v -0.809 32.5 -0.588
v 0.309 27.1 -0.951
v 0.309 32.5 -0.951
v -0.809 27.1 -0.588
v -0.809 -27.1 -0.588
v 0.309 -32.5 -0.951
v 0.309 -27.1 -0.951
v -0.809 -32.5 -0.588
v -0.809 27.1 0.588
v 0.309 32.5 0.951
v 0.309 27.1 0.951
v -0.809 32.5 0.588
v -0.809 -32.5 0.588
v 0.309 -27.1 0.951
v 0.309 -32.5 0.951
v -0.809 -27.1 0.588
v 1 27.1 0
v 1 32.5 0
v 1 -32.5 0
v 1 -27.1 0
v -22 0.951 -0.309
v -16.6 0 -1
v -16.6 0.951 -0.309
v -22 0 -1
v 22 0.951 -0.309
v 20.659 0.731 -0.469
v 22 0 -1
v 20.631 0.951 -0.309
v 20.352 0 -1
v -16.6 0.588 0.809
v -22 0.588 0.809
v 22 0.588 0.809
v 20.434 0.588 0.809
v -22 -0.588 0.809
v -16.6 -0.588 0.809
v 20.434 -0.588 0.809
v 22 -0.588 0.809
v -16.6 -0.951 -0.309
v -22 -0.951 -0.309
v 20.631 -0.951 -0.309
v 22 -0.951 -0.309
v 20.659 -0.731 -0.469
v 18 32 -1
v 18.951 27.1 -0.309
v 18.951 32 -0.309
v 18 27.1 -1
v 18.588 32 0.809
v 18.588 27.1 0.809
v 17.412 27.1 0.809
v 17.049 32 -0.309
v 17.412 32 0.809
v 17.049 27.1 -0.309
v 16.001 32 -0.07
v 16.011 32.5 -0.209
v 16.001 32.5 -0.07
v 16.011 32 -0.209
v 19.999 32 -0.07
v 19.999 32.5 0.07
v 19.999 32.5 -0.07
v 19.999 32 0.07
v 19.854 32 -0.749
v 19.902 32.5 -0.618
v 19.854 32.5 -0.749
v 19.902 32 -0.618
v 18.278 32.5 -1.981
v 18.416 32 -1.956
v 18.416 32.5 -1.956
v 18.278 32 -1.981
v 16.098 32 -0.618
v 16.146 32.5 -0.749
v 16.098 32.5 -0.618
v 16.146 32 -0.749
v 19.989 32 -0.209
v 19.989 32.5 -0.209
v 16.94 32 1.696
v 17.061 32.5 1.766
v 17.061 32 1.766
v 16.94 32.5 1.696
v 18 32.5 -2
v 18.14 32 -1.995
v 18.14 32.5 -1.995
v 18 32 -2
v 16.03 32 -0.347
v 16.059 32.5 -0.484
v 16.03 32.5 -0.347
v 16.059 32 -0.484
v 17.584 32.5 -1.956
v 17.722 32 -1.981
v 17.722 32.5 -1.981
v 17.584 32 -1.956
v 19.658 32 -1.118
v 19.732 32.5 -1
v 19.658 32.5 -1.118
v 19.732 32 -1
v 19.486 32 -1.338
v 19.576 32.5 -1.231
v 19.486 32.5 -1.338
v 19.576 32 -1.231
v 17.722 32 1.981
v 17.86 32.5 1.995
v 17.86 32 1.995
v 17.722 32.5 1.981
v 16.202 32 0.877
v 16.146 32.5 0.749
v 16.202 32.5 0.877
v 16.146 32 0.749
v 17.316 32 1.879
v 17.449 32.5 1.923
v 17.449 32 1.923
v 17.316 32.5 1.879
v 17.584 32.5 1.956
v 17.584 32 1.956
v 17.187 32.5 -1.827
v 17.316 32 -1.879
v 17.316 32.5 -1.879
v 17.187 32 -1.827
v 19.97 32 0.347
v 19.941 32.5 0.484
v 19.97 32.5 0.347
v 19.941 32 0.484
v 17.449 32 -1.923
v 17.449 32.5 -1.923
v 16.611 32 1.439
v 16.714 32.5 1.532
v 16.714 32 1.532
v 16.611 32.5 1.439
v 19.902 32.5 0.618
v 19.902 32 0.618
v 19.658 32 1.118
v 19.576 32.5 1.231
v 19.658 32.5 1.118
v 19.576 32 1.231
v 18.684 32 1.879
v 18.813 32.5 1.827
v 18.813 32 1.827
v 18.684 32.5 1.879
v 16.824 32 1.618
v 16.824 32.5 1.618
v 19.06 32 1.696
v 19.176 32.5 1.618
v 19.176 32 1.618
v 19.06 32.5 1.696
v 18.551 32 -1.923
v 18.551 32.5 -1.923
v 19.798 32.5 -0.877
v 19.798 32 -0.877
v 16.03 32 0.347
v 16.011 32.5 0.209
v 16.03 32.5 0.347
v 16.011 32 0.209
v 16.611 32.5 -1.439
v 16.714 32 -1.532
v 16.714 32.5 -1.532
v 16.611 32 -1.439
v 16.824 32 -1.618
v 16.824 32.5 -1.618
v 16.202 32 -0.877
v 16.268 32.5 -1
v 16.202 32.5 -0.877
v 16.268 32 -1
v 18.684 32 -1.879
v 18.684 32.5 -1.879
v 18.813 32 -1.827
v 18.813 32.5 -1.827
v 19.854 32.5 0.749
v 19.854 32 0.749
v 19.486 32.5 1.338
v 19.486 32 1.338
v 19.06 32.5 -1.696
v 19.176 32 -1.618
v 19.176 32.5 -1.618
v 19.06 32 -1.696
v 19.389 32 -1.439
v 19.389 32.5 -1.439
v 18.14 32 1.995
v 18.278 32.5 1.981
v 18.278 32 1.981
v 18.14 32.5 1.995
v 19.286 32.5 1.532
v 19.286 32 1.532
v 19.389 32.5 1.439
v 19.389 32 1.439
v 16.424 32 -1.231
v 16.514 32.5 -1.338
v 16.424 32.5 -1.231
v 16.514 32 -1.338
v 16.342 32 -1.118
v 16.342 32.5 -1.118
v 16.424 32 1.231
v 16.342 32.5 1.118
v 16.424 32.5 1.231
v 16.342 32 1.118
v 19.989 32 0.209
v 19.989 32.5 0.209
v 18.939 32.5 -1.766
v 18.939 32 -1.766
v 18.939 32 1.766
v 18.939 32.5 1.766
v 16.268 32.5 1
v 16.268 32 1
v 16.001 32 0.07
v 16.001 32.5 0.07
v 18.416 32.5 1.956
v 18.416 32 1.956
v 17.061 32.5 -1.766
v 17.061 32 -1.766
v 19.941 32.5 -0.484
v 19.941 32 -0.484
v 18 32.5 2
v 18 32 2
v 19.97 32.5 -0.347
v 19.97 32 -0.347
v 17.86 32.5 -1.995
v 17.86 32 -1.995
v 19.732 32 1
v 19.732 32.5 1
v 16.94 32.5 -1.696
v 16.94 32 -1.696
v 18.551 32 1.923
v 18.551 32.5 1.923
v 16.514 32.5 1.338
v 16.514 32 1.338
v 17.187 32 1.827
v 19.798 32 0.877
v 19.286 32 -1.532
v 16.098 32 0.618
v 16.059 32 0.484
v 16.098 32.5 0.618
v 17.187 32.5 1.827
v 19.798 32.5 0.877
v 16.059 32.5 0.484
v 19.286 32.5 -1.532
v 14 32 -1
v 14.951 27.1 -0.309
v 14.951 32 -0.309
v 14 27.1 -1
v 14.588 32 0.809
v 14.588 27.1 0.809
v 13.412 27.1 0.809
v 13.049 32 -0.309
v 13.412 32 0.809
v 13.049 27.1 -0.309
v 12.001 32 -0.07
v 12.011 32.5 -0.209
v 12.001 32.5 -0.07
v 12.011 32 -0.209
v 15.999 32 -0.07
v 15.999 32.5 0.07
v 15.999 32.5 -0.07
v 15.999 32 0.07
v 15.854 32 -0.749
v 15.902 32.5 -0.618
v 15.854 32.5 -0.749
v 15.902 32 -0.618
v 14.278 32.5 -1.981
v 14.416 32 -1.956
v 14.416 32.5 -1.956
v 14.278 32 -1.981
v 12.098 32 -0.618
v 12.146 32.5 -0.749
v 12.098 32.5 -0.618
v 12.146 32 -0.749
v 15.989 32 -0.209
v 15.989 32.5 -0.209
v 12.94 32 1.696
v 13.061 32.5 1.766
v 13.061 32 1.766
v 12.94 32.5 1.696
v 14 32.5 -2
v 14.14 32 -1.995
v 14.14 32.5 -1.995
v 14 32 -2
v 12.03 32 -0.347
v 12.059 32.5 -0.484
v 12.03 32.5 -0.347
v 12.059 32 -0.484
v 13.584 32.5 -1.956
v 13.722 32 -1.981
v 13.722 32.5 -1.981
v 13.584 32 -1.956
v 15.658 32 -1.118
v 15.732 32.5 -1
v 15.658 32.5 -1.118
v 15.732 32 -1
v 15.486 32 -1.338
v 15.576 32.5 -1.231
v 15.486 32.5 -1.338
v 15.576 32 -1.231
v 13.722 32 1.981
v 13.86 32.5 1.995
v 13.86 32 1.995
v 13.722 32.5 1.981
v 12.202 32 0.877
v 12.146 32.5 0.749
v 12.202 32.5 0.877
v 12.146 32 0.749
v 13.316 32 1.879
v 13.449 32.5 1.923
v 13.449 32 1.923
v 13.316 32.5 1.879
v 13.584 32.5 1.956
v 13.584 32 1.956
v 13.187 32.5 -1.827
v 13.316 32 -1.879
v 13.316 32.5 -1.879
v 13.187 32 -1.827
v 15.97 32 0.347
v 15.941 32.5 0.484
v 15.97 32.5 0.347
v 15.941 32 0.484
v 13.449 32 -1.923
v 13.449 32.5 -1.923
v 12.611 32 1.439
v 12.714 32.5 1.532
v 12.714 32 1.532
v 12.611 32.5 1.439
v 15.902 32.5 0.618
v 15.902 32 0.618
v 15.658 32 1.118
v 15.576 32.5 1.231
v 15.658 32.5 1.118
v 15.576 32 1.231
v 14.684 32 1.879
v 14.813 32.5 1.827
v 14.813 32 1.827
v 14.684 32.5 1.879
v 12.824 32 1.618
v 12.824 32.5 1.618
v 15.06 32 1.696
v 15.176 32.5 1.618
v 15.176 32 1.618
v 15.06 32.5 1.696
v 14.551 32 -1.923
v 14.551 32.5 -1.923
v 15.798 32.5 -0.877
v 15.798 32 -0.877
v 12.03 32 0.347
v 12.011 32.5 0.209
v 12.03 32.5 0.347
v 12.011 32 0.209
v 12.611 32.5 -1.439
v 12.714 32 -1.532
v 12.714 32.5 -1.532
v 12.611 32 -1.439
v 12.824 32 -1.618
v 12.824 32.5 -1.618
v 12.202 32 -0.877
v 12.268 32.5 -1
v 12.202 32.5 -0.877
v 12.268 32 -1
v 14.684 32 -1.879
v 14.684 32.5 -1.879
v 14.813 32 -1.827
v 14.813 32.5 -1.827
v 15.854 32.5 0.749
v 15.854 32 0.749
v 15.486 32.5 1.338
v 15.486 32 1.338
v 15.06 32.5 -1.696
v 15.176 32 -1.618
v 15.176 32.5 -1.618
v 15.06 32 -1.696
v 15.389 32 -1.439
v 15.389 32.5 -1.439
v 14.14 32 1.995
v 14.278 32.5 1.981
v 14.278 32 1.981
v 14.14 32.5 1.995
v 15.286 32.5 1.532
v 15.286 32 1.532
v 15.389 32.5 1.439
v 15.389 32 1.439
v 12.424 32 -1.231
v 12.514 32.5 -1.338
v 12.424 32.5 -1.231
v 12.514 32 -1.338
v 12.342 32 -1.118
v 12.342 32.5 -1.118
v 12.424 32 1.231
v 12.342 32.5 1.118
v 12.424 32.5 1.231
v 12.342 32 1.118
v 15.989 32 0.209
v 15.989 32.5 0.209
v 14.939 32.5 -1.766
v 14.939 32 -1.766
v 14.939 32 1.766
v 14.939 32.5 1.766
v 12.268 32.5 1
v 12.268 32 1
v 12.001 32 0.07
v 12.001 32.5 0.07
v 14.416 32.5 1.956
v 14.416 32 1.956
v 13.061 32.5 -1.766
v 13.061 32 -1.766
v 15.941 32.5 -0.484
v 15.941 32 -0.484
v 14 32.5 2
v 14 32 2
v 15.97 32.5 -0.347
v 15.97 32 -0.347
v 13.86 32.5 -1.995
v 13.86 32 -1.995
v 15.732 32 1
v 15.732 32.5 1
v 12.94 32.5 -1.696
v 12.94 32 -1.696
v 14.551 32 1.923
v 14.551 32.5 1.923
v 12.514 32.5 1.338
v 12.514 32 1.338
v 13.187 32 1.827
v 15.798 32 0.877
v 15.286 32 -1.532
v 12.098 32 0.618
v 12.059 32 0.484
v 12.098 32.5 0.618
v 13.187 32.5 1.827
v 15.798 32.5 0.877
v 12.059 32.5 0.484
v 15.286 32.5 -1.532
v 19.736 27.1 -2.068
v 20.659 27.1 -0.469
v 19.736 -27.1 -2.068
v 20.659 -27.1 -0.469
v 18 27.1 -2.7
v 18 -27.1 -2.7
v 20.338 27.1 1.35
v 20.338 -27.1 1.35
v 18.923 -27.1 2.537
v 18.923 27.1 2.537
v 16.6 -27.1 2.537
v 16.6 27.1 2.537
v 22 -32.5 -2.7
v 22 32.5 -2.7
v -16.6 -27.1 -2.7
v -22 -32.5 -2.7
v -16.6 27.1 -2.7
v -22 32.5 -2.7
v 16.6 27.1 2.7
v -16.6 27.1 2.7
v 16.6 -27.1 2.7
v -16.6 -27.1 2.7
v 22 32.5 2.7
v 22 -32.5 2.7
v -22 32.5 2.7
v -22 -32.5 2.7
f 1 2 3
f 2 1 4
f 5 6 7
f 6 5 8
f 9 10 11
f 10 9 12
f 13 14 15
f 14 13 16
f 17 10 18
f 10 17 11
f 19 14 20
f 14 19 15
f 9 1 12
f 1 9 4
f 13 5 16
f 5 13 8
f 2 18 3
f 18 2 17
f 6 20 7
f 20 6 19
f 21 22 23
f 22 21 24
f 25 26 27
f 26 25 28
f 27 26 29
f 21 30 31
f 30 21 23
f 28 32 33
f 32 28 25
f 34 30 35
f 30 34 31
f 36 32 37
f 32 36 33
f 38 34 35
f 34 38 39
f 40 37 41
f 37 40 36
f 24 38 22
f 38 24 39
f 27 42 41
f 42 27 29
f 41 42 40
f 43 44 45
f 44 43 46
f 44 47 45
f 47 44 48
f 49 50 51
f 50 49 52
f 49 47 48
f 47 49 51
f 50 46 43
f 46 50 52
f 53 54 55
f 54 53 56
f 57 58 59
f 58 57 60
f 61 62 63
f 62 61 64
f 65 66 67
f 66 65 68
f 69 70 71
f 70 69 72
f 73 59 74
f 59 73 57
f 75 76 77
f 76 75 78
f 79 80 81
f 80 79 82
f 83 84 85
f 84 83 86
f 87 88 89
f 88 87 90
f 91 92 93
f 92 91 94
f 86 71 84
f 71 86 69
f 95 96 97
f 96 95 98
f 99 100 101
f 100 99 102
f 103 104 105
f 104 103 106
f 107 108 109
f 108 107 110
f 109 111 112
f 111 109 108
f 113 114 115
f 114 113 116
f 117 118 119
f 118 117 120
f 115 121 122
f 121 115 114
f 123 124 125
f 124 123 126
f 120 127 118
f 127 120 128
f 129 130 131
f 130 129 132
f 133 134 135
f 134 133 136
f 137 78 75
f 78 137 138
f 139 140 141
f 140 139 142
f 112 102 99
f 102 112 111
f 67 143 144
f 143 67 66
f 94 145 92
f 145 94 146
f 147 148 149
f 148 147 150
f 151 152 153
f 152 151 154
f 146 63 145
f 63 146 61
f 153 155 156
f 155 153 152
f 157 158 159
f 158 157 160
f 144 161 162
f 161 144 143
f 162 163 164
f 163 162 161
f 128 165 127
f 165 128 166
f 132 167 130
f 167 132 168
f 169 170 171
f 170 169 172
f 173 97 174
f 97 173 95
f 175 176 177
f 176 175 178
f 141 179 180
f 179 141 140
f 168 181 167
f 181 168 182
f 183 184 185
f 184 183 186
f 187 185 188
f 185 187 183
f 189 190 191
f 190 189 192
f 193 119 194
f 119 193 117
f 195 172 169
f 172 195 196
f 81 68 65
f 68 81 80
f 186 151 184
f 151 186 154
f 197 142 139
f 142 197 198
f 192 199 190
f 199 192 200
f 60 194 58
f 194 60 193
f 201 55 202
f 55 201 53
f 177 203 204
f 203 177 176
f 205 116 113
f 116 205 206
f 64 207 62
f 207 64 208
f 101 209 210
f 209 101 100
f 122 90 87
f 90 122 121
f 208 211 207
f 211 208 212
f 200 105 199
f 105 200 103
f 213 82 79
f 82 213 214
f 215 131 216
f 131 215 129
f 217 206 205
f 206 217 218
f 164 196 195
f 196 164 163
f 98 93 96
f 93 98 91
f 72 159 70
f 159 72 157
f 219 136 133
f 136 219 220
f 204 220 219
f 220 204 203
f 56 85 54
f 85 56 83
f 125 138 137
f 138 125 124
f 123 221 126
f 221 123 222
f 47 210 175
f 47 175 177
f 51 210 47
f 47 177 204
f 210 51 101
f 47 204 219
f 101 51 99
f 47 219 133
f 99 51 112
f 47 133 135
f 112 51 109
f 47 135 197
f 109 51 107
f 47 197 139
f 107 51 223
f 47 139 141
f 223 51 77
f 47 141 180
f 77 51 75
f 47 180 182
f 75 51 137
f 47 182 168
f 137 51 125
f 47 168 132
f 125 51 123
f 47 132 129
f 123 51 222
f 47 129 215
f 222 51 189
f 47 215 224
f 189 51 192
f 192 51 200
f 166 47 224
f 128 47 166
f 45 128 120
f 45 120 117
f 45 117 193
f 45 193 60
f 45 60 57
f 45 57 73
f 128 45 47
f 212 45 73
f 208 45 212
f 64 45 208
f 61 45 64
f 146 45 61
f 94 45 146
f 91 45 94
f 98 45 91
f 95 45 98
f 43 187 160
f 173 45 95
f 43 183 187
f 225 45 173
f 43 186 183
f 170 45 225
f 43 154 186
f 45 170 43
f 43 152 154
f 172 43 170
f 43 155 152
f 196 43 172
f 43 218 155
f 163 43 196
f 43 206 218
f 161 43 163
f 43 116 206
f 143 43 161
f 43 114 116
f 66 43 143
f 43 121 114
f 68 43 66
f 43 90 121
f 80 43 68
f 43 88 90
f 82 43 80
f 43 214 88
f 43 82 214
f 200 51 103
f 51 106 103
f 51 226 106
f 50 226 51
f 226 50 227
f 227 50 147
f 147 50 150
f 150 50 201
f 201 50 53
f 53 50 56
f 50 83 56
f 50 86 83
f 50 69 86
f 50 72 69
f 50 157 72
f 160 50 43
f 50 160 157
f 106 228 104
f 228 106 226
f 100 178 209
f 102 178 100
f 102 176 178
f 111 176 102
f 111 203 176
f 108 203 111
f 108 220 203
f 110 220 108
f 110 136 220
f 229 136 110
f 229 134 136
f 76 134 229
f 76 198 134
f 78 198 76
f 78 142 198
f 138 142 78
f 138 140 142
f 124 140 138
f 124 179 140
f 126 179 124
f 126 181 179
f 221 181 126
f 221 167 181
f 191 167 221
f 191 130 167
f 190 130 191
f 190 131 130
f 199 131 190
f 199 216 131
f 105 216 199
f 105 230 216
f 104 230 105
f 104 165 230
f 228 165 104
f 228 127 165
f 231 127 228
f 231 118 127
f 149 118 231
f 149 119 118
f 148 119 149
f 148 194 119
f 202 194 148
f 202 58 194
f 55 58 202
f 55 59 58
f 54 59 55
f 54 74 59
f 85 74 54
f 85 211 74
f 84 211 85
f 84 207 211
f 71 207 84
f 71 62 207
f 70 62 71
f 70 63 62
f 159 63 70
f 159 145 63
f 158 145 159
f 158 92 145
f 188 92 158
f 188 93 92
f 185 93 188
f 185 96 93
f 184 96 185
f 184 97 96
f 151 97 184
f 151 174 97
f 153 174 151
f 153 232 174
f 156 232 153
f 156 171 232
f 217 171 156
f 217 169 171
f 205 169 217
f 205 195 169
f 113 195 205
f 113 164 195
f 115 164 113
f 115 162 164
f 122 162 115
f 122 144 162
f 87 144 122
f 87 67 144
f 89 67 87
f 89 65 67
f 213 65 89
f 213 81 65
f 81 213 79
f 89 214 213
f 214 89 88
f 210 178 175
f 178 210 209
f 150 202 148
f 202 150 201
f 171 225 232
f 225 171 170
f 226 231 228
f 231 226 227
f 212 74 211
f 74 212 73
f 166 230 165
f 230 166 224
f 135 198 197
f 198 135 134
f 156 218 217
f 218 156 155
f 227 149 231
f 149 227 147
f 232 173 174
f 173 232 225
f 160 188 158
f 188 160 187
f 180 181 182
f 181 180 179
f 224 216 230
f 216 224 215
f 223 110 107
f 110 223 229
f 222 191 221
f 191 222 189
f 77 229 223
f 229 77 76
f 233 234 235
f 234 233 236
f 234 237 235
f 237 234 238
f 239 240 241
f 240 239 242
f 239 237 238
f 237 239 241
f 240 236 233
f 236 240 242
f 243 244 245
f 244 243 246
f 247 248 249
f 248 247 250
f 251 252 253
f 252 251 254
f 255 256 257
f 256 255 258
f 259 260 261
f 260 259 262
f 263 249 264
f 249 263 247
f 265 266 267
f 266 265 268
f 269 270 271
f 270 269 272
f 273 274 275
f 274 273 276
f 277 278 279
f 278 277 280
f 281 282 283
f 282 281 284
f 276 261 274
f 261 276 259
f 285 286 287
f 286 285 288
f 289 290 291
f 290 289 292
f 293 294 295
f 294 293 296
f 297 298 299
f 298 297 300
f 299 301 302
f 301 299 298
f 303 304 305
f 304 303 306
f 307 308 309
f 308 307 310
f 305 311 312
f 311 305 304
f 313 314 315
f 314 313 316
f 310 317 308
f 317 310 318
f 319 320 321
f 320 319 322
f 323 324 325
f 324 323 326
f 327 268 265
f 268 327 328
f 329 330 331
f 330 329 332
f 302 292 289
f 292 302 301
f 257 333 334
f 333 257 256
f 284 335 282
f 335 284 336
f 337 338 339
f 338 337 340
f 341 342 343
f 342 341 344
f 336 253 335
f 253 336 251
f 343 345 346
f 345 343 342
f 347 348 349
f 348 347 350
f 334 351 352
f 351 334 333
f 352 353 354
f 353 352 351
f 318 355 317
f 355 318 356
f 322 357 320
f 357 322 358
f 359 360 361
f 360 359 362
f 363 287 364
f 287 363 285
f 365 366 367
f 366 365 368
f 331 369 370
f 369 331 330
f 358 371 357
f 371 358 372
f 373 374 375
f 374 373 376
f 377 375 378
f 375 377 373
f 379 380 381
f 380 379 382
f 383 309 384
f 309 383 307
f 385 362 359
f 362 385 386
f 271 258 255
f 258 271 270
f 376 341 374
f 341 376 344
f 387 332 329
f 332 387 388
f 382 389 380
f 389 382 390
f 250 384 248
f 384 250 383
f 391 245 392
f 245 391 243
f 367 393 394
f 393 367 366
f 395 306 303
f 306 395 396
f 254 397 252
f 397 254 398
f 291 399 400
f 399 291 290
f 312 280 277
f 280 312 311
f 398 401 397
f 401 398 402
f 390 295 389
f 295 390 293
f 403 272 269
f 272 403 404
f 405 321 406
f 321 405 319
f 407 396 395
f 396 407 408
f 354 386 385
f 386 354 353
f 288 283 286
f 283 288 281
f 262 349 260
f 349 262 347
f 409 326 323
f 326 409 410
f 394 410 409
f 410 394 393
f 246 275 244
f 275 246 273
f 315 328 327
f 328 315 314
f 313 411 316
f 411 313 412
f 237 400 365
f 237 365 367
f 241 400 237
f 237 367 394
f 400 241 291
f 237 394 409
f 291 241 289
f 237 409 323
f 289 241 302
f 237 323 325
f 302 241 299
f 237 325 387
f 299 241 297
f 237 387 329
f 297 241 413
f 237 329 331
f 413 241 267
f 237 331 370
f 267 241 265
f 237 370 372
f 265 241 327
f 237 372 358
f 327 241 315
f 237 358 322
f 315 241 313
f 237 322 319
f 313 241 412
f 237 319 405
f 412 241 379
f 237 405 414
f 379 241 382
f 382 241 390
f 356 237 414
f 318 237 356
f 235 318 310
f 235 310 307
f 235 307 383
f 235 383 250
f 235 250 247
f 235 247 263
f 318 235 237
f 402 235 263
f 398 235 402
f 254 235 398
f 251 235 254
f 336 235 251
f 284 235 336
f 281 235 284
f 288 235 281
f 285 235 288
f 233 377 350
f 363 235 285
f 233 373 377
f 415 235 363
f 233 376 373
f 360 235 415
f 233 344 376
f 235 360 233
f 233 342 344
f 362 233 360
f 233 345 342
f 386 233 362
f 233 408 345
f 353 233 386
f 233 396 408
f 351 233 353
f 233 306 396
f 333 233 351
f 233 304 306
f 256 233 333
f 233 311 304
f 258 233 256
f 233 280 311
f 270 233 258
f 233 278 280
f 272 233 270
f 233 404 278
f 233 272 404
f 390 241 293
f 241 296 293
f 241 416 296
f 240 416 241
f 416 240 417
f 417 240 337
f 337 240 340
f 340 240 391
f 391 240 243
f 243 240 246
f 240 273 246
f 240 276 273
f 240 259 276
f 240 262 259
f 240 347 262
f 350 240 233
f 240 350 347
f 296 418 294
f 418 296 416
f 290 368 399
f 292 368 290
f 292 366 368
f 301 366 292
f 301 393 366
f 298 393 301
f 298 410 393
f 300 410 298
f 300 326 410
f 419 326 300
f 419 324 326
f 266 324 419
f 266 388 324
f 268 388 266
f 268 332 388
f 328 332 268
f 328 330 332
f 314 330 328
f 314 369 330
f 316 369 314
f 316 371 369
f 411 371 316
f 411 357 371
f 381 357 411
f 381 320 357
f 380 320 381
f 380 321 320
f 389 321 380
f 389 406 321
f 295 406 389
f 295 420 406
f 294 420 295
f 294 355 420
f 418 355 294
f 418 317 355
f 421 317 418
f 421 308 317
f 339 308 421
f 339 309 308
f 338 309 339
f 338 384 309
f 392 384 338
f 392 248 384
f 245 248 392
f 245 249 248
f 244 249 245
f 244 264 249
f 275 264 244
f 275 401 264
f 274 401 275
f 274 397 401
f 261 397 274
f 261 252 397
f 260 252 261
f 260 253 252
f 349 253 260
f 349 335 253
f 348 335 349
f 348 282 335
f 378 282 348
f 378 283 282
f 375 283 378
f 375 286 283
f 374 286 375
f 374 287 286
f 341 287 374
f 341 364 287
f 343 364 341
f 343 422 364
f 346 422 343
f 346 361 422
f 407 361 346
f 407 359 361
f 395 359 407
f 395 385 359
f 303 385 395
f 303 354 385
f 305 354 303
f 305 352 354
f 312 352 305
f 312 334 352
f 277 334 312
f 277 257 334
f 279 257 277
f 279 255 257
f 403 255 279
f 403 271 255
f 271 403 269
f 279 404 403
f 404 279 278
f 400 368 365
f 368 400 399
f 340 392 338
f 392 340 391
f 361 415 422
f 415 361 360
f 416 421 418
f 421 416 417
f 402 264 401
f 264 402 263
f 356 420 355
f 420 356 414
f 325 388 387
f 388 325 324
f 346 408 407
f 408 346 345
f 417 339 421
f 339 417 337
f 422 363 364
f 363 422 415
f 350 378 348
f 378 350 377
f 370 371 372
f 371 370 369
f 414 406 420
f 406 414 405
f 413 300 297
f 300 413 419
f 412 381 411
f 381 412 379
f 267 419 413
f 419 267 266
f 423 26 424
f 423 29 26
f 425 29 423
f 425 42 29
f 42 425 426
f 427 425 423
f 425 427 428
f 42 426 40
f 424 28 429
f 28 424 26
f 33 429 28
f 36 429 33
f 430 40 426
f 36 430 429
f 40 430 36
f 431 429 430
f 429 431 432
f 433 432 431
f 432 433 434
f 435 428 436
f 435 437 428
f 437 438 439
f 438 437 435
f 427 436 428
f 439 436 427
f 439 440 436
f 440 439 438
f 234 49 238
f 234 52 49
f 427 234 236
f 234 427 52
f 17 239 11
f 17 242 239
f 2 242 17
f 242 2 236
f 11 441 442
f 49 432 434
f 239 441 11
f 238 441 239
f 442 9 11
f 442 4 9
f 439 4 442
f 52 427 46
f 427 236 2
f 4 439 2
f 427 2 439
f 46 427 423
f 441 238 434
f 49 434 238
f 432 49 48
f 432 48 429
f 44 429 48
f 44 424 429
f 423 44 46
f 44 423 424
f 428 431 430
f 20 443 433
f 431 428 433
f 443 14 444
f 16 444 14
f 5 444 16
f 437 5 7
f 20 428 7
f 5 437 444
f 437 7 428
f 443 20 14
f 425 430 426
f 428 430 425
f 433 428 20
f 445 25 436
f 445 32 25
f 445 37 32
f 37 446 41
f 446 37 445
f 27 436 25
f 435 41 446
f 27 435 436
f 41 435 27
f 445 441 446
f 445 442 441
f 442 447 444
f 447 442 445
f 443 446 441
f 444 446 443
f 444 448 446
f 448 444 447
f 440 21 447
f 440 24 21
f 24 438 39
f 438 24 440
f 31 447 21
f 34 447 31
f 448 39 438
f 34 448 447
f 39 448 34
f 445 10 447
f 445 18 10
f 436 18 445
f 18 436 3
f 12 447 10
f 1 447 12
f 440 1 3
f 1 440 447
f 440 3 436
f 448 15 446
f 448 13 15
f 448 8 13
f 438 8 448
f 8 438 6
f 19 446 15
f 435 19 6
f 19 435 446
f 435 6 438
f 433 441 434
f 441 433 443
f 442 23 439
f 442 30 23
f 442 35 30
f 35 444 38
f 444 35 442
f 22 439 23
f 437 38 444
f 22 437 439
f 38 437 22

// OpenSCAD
// Parametric Battery Power Supply
// Designed by Mike Creuzer thingiverse@creuzer.com 20130308




// The Width of the side that the contacts go on
BatteryWidth = 44;
// This very well may be the shorter side...
BatteryLength = 65;
// How thick the battery is
BatteryThickness = 5.4;

// How wide the nail shaft being used for the contact point is
PinThickness = 2;
// How wide the nail head being used for the contact point is
PinHeadThickness = 4;
// How thick the head of the nail being used for the contact point is
PinHeadDepth = .5;

// Center of pin to edge of battery block
Pin1DistanceFromEdge = 4;
// Center of pin to edge of battery block
Pin2DistanceFromEdge = 8;

// Size of hole to allow wire through the side of the battery
WireWidth = 2;
//WireDistanceFromEdge = 6;



// Build the box
difference()
{
	cube(size = [BatteryWidth, BatteryLength, BatteryThickness], center=true);
	cube(size = [BatteryWidth - BatteryThickness * 2, BatteryLength - BatteryThickness * 2, BatteryThickness + 1], center=true);
	WireHarness();
	InterfaceConnection();
}



module InterfaceConnection()
{
		translate([BatteryWidth * .5 - Pin1DistanceFromEdge, BatteryLength * .5,  0]) Pin();
		translate([BatteryWidth * .5 - Pin2DistanceFromEdge, BatteryLength * .5,  0]) Pin();
		
		hull() // Make sure this is room to solder the wires.
		{
			translate([BatteryWidth * .5 - Pin1DistanceFromEdge, BatteryLength * .5,  0]) PinElbowRoom();
			translate([BatteryWidth * .5 - Pin2DistanceFromEdge, BatteryLength * .5,  0]) PinElbowRoom();
		}
}


module Pin()
{
	translate([0, - (PinHeadDepth + BatteryThickness) * .5,  0]) union()
	{
	rotate([90,90,0]) cylinder(r = PinThickness * .5, h=BatteryThickness, center=true);
	translate([0, BatteryThickness * .5,  0]) rotate([90,90,0]) cylinder(r = PinHeadThickness * .5, h=PinHeadDepth, $fn=90, center=true);
	}
}

module PinElbowRoom()
{
	translate([0, - (BatteryLength- BatteryThickness) * .5,  0]) union()
	{
		translate([0, - BatteryThickness * .5,  0]) rotate([90,90,0]) cylinder(r = BatteryThickness * .5, h=BatteryLength - (2 * BatteryThickness ), center=true);
	}
}

module WireHarness()
{
	union() {
		rotate([90,0,0]) cylinder(r = WireWidth * .5, h=BatteryWidth + BatteryLength, center=true);
		rotate([0,90,0]) cylinder(r = WireWidth * .5, h=BatteryWidth + BatteryLength, center=true);
	}
}
